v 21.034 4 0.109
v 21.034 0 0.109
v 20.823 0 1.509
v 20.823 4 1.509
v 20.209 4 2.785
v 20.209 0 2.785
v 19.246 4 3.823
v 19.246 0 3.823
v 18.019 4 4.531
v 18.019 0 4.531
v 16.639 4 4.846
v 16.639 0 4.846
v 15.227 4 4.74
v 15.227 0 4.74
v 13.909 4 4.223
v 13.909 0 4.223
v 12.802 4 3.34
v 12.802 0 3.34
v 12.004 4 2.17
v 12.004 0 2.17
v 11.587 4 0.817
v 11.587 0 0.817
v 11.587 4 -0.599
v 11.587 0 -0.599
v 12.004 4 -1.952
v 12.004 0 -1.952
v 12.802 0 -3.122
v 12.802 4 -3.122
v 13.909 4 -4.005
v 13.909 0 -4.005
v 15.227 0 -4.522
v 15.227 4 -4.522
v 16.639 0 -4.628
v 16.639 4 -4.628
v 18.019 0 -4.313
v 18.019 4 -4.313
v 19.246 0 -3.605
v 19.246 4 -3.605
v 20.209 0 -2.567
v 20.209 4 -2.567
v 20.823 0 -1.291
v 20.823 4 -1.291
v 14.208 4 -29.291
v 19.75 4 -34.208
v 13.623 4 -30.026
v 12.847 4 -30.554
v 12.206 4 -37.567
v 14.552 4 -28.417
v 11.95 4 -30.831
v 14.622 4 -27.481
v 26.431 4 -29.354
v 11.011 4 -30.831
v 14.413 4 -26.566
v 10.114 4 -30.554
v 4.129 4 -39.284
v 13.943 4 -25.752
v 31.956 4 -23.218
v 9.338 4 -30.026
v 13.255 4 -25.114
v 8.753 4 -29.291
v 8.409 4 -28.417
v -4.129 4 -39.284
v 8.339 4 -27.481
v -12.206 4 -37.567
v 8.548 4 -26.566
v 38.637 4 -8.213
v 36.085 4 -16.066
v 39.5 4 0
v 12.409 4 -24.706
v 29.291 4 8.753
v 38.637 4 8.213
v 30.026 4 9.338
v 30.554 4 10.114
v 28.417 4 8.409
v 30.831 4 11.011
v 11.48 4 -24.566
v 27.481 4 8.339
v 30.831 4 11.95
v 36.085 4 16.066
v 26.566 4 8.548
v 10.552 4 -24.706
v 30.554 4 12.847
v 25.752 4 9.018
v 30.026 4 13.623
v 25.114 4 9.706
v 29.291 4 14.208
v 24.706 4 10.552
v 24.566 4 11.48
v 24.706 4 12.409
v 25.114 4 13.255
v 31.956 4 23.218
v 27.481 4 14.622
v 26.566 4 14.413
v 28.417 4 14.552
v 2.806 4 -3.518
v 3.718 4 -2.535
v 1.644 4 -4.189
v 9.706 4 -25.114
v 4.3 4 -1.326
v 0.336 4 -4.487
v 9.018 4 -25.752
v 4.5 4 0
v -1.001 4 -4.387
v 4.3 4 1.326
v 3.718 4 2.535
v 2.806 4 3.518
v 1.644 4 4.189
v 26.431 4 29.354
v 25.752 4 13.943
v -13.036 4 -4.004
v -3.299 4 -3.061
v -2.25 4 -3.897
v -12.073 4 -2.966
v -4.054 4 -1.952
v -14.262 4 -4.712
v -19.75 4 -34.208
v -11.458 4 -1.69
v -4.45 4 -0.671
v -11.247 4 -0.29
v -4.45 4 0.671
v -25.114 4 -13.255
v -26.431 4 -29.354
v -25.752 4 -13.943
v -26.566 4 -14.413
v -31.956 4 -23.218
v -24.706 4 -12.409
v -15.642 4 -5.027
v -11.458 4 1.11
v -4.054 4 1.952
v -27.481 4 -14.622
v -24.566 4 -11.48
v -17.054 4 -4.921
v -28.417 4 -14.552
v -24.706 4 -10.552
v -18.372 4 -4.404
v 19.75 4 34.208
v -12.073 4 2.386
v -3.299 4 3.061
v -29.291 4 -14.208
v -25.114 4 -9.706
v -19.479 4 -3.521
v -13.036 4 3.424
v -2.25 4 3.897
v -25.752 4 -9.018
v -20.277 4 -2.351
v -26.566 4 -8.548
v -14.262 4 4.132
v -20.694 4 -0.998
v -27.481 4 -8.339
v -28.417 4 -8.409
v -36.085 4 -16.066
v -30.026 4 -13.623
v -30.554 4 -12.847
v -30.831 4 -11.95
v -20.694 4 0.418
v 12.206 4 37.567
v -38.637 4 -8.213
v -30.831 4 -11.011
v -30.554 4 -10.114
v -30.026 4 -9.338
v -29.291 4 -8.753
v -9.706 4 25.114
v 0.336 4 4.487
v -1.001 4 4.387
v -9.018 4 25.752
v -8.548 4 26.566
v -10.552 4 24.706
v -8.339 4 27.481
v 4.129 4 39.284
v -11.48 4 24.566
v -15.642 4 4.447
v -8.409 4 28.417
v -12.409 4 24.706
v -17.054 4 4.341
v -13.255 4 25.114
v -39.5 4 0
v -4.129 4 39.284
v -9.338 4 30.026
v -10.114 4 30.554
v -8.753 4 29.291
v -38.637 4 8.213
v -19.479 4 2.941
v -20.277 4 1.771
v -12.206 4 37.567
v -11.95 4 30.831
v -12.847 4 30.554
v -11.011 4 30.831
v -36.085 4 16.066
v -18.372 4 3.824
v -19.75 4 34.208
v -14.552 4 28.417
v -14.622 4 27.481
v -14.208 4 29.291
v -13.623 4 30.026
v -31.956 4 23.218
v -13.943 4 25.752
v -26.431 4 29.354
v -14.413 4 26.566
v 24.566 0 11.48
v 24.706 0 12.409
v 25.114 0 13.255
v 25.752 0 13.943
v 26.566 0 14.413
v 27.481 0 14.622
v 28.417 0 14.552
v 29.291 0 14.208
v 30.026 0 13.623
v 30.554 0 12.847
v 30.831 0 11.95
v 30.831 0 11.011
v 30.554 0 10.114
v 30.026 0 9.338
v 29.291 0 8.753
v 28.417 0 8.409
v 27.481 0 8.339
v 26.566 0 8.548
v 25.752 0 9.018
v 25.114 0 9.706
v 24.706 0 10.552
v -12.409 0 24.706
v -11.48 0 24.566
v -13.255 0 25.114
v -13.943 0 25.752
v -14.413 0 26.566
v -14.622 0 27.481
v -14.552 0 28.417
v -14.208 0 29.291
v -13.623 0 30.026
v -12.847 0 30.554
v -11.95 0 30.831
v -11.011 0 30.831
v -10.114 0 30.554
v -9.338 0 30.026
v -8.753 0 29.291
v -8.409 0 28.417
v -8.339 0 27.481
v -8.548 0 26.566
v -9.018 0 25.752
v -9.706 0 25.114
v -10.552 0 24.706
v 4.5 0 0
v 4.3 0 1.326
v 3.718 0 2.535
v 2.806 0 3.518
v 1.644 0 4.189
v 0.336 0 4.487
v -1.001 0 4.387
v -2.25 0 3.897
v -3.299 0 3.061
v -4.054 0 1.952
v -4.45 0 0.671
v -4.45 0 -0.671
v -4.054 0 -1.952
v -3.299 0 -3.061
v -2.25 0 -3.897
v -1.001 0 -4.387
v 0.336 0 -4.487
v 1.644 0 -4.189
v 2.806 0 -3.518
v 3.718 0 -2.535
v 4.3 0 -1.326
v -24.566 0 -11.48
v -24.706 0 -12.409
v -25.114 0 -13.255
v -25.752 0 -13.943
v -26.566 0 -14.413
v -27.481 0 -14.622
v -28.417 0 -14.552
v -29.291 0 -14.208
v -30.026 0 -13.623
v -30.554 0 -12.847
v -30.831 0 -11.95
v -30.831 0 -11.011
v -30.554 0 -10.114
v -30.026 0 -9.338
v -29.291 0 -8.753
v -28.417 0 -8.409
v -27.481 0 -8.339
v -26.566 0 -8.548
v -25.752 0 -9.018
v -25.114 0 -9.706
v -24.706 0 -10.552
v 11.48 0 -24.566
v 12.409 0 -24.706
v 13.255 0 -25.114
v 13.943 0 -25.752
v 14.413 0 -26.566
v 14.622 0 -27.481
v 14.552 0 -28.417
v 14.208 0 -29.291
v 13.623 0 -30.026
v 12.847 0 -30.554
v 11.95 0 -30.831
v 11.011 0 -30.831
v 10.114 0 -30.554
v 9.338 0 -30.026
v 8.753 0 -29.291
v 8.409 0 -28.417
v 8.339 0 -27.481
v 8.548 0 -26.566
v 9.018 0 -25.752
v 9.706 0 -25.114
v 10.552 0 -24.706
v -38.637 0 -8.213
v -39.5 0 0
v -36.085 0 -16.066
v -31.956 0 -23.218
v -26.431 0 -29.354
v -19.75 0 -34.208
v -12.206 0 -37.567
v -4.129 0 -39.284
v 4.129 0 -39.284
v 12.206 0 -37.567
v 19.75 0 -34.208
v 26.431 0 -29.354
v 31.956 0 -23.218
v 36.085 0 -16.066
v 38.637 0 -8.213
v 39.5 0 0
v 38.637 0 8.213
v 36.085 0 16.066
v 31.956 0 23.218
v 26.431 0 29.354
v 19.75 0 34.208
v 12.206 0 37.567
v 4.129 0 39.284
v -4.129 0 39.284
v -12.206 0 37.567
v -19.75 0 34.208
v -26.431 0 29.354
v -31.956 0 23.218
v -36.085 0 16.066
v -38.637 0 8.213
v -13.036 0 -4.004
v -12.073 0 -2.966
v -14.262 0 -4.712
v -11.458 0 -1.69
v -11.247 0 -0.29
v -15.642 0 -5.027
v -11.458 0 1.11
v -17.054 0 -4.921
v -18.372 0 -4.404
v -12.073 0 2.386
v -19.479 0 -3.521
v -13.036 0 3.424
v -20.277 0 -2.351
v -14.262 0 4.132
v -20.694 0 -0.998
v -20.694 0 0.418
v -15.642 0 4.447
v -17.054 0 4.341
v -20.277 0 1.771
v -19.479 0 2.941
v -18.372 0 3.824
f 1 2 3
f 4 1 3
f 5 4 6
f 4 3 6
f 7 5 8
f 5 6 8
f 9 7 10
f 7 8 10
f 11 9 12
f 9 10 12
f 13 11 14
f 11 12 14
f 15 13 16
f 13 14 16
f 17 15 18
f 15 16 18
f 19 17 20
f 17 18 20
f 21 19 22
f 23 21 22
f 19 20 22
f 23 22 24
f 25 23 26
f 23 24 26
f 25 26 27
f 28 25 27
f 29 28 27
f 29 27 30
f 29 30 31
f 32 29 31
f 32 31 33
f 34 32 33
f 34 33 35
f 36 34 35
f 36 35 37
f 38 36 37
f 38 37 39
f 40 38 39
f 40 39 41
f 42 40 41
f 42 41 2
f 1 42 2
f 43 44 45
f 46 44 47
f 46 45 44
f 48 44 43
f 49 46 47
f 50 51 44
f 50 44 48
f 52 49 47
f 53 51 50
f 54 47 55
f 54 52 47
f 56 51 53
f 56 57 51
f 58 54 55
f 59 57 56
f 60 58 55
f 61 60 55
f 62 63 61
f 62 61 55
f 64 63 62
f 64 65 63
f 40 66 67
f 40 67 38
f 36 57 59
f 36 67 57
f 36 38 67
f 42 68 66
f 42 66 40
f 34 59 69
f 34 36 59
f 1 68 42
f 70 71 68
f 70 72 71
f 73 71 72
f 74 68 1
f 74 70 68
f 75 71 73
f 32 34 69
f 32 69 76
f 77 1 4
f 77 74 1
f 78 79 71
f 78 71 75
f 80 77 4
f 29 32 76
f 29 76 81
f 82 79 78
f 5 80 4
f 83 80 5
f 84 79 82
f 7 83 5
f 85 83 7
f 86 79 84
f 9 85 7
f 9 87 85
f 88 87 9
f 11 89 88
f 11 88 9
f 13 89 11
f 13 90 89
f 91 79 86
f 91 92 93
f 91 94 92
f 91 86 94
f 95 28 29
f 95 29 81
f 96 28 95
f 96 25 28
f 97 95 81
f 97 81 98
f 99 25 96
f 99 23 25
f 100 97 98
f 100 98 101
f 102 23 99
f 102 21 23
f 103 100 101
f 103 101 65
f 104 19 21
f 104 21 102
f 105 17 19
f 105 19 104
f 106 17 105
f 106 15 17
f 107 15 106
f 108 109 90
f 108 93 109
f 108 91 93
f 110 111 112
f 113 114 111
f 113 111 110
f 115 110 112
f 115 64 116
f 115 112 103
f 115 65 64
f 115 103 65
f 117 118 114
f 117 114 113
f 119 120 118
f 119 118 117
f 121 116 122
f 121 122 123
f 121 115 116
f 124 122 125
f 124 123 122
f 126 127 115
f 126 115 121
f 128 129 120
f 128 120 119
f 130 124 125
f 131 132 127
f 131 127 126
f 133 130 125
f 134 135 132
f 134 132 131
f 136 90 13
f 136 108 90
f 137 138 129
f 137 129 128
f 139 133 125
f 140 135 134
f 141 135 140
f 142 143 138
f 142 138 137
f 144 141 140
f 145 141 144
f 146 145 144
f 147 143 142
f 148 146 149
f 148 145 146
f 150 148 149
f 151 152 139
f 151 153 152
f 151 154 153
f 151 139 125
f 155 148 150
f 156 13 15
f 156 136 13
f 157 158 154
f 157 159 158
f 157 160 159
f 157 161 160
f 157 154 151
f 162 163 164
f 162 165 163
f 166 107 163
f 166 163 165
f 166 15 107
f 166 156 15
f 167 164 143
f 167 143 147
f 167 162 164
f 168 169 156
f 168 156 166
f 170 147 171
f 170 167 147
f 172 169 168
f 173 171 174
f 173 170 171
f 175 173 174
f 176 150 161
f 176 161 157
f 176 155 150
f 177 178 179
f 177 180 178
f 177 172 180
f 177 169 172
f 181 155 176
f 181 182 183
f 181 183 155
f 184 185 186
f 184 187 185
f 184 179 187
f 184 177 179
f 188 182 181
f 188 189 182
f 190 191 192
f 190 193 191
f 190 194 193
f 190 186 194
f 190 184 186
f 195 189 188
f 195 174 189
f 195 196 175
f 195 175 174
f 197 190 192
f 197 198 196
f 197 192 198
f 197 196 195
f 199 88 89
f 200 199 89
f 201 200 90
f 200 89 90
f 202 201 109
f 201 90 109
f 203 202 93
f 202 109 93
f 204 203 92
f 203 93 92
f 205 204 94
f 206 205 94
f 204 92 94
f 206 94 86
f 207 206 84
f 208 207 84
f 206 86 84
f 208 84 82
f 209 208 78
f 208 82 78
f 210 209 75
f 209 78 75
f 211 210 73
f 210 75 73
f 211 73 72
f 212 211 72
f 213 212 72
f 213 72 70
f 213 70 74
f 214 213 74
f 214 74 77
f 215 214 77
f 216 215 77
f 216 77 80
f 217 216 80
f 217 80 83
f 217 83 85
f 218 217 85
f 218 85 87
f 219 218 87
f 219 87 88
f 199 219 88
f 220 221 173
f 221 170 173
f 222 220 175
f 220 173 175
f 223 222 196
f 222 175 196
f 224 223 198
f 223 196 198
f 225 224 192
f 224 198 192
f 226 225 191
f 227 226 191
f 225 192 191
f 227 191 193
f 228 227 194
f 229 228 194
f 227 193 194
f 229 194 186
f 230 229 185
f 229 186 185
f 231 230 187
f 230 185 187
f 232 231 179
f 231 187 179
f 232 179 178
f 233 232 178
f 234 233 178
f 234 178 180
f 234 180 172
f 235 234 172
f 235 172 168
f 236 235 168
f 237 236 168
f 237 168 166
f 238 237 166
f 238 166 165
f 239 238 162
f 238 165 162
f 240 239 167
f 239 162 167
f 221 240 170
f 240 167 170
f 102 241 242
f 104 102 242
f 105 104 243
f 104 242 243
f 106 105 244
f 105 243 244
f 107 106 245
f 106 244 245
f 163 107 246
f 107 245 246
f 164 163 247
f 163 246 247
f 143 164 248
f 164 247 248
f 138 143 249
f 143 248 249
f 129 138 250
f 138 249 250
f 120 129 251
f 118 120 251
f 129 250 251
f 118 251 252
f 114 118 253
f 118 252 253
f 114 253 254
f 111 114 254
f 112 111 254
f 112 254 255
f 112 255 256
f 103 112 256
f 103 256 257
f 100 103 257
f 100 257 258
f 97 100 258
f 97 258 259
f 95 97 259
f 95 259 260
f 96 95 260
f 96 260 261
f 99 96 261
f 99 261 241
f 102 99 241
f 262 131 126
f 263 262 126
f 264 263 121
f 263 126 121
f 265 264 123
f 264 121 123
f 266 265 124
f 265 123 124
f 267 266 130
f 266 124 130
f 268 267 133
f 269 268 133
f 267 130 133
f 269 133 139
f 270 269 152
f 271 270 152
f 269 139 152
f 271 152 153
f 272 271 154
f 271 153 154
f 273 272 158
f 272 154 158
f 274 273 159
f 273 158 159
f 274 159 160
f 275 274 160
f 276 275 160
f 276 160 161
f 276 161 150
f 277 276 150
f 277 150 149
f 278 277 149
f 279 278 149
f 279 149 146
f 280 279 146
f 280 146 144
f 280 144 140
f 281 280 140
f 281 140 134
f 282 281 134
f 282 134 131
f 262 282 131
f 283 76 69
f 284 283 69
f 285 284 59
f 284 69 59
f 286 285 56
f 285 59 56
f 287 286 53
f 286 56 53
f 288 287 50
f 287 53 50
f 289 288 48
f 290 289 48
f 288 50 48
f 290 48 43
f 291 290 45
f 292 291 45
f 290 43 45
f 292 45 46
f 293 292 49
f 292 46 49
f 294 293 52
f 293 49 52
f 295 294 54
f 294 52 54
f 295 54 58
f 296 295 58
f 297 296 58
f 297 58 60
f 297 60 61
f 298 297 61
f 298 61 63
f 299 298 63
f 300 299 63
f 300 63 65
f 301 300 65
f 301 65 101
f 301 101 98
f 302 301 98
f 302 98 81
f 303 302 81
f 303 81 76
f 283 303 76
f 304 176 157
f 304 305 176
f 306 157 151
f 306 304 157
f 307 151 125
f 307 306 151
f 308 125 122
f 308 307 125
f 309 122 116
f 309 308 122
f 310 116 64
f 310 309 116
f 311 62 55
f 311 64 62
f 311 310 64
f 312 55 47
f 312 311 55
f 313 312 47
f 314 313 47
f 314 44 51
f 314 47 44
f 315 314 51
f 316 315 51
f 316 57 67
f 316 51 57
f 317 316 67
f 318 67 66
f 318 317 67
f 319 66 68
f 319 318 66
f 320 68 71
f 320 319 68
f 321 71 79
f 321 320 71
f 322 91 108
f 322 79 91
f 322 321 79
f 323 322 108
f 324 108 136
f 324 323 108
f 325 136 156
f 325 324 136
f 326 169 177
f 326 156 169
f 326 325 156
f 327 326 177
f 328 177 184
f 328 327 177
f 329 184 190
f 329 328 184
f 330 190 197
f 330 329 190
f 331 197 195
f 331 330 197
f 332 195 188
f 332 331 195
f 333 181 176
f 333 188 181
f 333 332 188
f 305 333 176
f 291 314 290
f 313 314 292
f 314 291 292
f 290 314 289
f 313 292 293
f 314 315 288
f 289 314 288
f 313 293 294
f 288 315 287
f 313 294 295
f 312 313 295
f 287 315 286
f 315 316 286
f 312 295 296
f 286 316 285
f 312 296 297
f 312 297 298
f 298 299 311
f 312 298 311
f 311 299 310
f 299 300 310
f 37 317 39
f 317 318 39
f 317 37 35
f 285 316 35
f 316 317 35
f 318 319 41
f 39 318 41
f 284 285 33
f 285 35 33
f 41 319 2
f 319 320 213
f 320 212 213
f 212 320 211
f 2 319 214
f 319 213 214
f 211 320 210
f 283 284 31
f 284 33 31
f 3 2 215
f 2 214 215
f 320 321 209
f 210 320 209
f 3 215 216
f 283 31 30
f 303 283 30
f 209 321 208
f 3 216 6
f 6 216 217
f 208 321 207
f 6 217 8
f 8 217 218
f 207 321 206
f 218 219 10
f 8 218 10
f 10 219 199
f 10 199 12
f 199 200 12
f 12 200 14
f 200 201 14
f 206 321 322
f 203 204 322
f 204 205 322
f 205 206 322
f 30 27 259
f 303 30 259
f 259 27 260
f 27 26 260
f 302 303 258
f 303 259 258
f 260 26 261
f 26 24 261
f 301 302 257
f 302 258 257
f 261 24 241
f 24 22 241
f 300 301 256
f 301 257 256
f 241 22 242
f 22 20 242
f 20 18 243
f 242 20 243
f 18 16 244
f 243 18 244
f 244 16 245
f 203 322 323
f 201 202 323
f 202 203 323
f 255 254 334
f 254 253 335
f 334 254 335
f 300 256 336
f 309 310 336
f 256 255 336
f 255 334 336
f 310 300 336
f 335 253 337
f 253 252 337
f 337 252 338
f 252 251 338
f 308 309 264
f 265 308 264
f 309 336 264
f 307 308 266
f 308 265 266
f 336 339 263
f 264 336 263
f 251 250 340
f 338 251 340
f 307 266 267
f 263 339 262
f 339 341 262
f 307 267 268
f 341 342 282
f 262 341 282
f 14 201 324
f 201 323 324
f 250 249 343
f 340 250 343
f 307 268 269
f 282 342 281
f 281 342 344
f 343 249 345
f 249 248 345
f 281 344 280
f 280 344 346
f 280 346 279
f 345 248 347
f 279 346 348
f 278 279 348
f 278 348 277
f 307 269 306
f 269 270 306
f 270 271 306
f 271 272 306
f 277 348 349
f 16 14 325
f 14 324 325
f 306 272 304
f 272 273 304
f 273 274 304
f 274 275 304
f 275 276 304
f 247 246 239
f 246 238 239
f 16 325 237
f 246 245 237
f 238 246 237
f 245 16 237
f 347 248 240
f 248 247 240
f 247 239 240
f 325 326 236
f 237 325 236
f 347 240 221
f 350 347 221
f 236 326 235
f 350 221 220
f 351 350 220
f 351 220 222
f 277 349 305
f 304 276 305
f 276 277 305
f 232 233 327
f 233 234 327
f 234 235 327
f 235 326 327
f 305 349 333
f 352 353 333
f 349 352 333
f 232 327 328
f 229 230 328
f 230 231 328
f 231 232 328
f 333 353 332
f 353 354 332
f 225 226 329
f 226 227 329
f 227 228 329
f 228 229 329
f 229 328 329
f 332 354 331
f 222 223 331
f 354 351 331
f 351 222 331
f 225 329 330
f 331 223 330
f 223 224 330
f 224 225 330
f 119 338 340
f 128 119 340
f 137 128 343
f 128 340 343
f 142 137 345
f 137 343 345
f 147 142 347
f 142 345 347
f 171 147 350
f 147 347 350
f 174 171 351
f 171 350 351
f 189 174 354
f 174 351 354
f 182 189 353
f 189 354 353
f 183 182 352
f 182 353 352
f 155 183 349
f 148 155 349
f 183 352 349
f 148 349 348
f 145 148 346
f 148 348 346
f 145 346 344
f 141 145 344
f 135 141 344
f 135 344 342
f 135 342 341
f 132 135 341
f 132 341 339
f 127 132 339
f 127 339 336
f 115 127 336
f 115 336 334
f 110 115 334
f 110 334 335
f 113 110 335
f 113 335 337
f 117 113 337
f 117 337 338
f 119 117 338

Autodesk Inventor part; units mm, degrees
ref_plane "YZ Plane" through (0, 0, 0) normal (1, 0, 0) x (0, 1, 0)
ref_plane "XZ Plane" through (0, 0, 0) normal (0, 1, 0) x (-1, 0, 0)
ref_plane "XY Plane" through (0, 0, 0) normal (0, 0, 1) x (1, 0, 0)
sketch "Эскиз1" plane through (0, 0, 0) normal (0, 1, 0) x (-1, 0, 0)
  circle A0 centre (0, 0) radius 39.5
  circle A1 centre (0, 0) radius 4
  dimension "d0" = 79
  dimension "d3" = 8
extrude "Выдавливание2" add sketch "Эскиз1" along normal blind 4
sketch "Эскиз3" plane through (0, 0, 0) normal (0, -1, 0) x (1, 0, 0)
  circle A0 centre (16.284, 0.1089) radius 4.75 projected
  circle A1 centre (-15.9974, -0.2901) radius 4.75 projected
  circle A2 centre (0, 0) radius 4.5
  dimension "d8" = 9
extrude "Выдавливание3" cut sketch "Эскиз3" against normal blind 4
sketch "Эскиз4" plane through (0, 4, 0) normal (0, 1, 0) x (1, 0, 0)
  circle A0 centre (-27.7164, 11.4805) radius 4 construction
  circle A1 centre (-27.7164, 11.4805) radius 3.15
  point P0 (0, 0)
  dimension "d11" = 6.3
extrude "Выдавливание4" cut sketch "Эскиз4" against normal blind 4
pattern_circular "Круговой массив1" count 4 over 360 about axis through (0, 0, 0) along (0, 1, 0) of "Выдавливание4"
properties part number "Prostavka"
